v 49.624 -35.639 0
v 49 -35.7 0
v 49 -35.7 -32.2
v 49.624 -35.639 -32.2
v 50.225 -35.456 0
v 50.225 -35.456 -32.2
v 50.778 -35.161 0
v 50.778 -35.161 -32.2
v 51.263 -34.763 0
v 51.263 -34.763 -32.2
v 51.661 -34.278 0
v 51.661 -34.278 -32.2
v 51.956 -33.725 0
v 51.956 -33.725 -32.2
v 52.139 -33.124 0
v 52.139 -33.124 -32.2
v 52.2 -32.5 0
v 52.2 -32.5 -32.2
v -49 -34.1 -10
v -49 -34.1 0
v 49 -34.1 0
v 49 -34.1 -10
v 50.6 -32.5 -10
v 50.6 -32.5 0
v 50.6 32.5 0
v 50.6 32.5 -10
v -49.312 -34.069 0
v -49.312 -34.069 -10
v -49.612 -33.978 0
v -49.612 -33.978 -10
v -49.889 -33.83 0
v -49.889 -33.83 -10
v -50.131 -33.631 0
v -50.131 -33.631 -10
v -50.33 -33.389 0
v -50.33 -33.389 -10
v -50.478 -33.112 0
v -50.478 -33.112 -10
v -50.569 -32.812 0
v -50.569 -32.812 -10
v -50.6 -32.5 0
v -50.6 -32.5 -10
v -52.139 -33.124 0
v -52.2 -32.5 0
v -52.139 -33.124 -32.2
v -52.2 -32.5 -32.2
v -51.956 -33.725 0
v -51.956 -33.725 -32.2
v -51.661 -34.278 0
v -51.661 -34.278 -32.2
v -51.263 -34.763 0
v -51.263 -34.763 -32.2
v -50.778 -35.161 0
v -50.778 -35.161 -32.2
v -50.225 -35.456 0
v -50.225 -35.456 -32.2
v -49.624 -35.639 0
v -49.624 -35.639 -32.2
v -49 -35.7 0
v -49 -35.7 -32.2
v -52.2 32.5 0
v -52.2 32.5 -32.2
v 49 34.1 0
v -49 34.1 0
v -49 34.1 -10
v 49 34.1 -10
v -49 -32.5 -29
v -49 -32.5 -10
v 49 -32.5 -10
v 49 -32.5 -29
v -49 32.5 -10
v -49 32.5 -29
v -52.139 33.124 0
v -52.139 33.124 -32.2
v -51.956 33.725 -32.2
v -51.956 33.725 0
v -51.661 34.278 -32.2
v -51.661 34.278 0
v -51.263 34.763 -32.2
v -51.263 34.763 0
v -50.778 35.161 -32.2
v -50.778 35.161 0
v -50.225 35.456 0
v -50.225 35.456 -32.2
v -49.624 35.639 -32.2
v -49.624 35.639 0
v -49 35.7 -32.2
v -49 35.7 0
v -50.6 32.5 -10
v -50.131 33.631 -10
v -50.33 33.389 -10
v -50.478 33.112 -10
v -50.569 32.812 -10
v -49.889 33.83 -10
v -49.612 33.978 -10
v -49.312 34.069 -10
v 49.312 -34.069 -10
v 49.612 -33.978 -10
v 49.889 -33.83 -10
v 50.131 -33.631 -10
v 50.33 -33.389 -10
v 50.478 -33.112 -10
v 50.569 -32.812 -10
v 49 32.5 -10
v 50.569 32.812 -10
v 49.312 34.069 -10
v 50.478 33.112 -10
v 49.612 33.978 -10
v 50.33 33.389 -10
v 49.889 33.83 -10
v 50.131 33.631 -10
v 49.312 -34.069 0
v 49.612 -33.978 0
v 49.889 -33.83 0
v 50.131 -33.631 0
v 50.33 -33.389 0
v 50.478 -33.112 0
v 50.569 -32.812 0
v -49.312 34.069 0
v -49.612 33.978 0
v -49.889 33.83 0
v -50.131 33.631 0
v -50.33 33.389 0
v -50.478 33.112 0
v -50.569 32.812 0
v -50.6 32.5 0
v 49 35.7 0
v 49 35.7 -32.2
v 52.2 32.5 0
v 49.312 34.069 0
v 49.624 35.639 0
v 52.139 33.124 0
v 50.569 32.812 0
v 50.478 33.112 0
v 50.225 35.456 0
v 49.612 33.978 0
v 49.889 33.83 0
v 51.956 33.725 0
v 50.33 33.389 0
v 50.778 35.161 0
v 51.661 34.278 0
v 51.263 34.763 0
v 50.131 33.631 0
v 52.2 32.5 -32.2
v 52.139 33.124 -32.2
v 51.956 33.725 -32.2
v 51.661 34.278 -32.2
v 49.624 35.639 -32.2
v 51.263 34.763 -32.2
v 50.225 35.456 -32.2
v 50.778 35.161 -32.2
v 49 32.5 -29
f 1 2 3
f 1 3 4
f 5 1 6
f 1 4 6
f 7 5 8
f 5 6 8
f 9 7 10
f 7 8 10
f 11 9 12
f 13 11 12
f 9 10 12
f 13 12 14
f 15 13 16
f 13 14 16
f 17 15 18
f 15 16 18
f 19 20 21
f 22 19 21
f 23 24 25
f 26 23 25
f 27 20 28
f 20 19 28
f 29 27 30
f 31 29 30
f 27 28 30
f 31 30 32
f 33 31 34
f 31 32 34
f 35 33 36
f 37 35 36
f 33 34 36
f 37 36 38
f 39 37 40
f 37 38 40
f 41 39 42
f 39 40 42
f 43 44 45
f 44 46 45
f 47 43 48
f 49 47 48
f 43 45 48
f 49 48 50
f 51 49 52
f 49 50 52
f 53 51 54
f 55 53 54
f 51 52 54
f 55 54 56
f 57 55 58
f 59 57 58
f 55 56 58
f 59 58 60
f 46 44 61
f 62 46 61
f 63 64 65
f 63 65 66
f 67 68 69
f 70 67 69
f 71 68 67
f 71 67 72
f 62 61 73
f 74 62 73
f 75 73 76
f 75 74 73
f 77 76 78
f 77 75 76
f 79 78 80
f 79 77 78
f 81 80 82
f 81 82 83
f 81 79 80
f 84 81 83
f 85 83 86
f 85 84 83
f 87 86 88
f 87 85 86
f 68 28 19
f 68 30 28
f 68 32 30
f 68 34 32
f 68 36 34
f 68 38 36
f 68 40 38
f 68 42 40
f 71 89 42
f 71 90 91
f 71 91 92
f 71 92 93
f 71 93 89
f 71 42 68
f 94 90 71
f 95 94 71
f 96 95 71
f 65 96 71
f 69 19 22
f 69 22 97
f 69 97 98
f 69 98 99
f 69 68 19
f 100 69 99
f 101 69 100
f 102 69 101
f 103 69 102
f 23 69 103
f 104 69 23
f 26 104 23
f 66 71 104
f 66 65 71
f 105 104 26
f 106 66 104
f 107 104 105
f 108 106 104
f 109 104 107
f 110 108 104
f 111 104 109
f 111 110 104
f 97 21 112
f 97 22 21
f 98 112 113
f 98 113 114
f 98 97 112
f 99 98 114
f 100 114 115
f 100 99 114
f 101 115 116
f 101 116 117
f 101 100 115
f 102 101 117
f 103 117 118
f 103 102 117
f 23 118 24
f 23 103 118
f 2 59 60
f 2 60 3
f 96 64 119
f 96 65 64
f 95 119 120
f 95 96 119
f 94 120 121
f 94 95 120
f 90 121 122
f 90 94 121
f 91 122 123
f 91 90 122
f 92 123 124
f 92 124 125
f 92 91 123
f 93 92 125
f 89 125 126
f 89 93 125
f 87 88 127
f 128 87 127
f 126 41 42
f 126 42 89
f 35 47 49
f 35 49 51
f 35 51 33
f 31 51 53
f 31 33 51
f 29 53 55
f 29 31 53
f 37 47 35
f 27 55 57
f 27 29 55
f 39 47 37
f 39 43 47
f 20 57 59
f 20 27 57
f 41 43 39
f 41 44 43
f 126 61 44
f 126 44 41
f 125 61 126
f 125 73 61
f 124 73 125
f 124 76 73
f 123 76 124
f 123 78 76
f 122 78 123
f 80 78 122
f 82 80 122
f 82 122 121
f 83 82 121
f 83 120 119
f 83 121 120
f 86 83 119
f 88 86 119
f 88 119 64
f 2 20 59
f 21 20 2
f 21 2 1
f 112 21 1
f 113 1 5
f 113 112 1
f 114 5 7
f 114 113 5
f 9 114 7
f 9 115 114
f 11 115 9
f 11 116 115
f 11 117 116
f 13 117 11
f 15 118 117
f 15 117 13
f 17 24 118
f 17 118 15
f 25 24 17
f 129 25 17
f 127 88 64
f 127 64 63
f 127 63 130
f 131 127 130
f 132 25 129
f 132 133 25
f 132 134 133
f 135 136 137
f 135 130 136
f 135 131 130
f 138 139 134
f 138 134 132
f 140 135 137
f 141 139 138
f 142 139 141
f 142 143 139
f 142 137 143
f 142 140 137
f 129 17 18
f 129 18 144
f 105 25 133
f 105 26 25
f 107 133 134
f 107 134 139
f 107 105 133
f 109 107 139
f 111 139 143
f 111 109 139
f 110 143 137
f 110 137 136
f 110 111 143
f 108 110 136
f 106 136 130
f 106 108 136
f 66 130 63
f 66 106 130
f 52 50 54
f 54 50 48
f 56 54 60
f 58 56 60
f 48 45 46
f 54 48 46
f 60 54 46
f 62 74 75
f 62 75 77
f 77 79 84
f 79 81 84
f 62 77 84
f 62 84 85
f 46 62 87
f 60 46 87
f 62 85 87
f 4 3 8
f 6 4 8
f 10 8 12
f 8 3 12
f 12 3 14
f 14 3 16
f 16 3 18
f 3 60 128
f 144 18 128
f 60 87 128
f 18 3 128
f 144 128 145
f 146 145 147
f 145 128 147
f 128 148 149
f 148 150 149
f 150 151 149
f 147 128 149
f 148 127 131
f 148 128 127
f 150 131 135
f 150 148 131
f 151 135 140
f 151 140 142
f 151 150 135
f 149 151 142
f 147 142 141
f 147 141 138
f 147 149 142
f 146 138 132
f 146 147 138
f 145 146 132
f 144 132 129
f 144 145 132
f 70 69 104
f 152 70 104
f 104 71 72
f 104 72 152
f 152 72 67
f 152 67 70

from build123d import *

# Parameters (mm, degrees)
F3_W     = 104.4
F3_H     = 71.4
F6_DEPTH = 32.2
F4_W     = 101.2
F4_H     = 68.2
F7_DEPTH = 10
F5_W     = 98
F5_H     = 65
F8_DEPTH = 29
F9_R     = 3.2
F10_R    = 1.6


with BuildPart() as f6:
    # F3 (on Top) → F6 (new body)
    with BuildSketch(Plane.XY):
        Rectangle(F3_W, F3_H)
    extrude(amount=-F6_DEPTH)

    # F4 (on Top) → F7 (cut)
    with BuildSketch(Plane.XY):
        Rectangle(F4_W, F4_H)
    extrude(amount=-F7_DEPTH, mode=Mode.SUBTRACT)

    # F5 (on Top) → F8 (cut)
    with BuildSketch(Plane.XY):
        Rectangle(F5_W, F5_H)
    extrude(amount=-F8_DEPTH, mode=Mode.SUBTRACT)

    # F9
    f9_edges = [f6.edges().sort_by_distance(p)[0] for p in [
        (-52.2, -35.7, -16.1),
        (52.2, -35.7, -16.1),
        (52.2, 35.7, -16.1),
        (-52.2, 35.7, -16.1),
    ]]
    fillet(f9_edges, radius=F9_R)

    # F10
    f10_edges = [f6.edges().sort_by_distance(p)[0] for p in [
        (-50.6, 34.1, -5),
        (-50.6, -34.1, -5),
        (50.6, 34.1, -5),
        (50.6, -34.1, -5),
    ]]
    fillet(f10_edges, radius=F10_R)


solid = f6.part
